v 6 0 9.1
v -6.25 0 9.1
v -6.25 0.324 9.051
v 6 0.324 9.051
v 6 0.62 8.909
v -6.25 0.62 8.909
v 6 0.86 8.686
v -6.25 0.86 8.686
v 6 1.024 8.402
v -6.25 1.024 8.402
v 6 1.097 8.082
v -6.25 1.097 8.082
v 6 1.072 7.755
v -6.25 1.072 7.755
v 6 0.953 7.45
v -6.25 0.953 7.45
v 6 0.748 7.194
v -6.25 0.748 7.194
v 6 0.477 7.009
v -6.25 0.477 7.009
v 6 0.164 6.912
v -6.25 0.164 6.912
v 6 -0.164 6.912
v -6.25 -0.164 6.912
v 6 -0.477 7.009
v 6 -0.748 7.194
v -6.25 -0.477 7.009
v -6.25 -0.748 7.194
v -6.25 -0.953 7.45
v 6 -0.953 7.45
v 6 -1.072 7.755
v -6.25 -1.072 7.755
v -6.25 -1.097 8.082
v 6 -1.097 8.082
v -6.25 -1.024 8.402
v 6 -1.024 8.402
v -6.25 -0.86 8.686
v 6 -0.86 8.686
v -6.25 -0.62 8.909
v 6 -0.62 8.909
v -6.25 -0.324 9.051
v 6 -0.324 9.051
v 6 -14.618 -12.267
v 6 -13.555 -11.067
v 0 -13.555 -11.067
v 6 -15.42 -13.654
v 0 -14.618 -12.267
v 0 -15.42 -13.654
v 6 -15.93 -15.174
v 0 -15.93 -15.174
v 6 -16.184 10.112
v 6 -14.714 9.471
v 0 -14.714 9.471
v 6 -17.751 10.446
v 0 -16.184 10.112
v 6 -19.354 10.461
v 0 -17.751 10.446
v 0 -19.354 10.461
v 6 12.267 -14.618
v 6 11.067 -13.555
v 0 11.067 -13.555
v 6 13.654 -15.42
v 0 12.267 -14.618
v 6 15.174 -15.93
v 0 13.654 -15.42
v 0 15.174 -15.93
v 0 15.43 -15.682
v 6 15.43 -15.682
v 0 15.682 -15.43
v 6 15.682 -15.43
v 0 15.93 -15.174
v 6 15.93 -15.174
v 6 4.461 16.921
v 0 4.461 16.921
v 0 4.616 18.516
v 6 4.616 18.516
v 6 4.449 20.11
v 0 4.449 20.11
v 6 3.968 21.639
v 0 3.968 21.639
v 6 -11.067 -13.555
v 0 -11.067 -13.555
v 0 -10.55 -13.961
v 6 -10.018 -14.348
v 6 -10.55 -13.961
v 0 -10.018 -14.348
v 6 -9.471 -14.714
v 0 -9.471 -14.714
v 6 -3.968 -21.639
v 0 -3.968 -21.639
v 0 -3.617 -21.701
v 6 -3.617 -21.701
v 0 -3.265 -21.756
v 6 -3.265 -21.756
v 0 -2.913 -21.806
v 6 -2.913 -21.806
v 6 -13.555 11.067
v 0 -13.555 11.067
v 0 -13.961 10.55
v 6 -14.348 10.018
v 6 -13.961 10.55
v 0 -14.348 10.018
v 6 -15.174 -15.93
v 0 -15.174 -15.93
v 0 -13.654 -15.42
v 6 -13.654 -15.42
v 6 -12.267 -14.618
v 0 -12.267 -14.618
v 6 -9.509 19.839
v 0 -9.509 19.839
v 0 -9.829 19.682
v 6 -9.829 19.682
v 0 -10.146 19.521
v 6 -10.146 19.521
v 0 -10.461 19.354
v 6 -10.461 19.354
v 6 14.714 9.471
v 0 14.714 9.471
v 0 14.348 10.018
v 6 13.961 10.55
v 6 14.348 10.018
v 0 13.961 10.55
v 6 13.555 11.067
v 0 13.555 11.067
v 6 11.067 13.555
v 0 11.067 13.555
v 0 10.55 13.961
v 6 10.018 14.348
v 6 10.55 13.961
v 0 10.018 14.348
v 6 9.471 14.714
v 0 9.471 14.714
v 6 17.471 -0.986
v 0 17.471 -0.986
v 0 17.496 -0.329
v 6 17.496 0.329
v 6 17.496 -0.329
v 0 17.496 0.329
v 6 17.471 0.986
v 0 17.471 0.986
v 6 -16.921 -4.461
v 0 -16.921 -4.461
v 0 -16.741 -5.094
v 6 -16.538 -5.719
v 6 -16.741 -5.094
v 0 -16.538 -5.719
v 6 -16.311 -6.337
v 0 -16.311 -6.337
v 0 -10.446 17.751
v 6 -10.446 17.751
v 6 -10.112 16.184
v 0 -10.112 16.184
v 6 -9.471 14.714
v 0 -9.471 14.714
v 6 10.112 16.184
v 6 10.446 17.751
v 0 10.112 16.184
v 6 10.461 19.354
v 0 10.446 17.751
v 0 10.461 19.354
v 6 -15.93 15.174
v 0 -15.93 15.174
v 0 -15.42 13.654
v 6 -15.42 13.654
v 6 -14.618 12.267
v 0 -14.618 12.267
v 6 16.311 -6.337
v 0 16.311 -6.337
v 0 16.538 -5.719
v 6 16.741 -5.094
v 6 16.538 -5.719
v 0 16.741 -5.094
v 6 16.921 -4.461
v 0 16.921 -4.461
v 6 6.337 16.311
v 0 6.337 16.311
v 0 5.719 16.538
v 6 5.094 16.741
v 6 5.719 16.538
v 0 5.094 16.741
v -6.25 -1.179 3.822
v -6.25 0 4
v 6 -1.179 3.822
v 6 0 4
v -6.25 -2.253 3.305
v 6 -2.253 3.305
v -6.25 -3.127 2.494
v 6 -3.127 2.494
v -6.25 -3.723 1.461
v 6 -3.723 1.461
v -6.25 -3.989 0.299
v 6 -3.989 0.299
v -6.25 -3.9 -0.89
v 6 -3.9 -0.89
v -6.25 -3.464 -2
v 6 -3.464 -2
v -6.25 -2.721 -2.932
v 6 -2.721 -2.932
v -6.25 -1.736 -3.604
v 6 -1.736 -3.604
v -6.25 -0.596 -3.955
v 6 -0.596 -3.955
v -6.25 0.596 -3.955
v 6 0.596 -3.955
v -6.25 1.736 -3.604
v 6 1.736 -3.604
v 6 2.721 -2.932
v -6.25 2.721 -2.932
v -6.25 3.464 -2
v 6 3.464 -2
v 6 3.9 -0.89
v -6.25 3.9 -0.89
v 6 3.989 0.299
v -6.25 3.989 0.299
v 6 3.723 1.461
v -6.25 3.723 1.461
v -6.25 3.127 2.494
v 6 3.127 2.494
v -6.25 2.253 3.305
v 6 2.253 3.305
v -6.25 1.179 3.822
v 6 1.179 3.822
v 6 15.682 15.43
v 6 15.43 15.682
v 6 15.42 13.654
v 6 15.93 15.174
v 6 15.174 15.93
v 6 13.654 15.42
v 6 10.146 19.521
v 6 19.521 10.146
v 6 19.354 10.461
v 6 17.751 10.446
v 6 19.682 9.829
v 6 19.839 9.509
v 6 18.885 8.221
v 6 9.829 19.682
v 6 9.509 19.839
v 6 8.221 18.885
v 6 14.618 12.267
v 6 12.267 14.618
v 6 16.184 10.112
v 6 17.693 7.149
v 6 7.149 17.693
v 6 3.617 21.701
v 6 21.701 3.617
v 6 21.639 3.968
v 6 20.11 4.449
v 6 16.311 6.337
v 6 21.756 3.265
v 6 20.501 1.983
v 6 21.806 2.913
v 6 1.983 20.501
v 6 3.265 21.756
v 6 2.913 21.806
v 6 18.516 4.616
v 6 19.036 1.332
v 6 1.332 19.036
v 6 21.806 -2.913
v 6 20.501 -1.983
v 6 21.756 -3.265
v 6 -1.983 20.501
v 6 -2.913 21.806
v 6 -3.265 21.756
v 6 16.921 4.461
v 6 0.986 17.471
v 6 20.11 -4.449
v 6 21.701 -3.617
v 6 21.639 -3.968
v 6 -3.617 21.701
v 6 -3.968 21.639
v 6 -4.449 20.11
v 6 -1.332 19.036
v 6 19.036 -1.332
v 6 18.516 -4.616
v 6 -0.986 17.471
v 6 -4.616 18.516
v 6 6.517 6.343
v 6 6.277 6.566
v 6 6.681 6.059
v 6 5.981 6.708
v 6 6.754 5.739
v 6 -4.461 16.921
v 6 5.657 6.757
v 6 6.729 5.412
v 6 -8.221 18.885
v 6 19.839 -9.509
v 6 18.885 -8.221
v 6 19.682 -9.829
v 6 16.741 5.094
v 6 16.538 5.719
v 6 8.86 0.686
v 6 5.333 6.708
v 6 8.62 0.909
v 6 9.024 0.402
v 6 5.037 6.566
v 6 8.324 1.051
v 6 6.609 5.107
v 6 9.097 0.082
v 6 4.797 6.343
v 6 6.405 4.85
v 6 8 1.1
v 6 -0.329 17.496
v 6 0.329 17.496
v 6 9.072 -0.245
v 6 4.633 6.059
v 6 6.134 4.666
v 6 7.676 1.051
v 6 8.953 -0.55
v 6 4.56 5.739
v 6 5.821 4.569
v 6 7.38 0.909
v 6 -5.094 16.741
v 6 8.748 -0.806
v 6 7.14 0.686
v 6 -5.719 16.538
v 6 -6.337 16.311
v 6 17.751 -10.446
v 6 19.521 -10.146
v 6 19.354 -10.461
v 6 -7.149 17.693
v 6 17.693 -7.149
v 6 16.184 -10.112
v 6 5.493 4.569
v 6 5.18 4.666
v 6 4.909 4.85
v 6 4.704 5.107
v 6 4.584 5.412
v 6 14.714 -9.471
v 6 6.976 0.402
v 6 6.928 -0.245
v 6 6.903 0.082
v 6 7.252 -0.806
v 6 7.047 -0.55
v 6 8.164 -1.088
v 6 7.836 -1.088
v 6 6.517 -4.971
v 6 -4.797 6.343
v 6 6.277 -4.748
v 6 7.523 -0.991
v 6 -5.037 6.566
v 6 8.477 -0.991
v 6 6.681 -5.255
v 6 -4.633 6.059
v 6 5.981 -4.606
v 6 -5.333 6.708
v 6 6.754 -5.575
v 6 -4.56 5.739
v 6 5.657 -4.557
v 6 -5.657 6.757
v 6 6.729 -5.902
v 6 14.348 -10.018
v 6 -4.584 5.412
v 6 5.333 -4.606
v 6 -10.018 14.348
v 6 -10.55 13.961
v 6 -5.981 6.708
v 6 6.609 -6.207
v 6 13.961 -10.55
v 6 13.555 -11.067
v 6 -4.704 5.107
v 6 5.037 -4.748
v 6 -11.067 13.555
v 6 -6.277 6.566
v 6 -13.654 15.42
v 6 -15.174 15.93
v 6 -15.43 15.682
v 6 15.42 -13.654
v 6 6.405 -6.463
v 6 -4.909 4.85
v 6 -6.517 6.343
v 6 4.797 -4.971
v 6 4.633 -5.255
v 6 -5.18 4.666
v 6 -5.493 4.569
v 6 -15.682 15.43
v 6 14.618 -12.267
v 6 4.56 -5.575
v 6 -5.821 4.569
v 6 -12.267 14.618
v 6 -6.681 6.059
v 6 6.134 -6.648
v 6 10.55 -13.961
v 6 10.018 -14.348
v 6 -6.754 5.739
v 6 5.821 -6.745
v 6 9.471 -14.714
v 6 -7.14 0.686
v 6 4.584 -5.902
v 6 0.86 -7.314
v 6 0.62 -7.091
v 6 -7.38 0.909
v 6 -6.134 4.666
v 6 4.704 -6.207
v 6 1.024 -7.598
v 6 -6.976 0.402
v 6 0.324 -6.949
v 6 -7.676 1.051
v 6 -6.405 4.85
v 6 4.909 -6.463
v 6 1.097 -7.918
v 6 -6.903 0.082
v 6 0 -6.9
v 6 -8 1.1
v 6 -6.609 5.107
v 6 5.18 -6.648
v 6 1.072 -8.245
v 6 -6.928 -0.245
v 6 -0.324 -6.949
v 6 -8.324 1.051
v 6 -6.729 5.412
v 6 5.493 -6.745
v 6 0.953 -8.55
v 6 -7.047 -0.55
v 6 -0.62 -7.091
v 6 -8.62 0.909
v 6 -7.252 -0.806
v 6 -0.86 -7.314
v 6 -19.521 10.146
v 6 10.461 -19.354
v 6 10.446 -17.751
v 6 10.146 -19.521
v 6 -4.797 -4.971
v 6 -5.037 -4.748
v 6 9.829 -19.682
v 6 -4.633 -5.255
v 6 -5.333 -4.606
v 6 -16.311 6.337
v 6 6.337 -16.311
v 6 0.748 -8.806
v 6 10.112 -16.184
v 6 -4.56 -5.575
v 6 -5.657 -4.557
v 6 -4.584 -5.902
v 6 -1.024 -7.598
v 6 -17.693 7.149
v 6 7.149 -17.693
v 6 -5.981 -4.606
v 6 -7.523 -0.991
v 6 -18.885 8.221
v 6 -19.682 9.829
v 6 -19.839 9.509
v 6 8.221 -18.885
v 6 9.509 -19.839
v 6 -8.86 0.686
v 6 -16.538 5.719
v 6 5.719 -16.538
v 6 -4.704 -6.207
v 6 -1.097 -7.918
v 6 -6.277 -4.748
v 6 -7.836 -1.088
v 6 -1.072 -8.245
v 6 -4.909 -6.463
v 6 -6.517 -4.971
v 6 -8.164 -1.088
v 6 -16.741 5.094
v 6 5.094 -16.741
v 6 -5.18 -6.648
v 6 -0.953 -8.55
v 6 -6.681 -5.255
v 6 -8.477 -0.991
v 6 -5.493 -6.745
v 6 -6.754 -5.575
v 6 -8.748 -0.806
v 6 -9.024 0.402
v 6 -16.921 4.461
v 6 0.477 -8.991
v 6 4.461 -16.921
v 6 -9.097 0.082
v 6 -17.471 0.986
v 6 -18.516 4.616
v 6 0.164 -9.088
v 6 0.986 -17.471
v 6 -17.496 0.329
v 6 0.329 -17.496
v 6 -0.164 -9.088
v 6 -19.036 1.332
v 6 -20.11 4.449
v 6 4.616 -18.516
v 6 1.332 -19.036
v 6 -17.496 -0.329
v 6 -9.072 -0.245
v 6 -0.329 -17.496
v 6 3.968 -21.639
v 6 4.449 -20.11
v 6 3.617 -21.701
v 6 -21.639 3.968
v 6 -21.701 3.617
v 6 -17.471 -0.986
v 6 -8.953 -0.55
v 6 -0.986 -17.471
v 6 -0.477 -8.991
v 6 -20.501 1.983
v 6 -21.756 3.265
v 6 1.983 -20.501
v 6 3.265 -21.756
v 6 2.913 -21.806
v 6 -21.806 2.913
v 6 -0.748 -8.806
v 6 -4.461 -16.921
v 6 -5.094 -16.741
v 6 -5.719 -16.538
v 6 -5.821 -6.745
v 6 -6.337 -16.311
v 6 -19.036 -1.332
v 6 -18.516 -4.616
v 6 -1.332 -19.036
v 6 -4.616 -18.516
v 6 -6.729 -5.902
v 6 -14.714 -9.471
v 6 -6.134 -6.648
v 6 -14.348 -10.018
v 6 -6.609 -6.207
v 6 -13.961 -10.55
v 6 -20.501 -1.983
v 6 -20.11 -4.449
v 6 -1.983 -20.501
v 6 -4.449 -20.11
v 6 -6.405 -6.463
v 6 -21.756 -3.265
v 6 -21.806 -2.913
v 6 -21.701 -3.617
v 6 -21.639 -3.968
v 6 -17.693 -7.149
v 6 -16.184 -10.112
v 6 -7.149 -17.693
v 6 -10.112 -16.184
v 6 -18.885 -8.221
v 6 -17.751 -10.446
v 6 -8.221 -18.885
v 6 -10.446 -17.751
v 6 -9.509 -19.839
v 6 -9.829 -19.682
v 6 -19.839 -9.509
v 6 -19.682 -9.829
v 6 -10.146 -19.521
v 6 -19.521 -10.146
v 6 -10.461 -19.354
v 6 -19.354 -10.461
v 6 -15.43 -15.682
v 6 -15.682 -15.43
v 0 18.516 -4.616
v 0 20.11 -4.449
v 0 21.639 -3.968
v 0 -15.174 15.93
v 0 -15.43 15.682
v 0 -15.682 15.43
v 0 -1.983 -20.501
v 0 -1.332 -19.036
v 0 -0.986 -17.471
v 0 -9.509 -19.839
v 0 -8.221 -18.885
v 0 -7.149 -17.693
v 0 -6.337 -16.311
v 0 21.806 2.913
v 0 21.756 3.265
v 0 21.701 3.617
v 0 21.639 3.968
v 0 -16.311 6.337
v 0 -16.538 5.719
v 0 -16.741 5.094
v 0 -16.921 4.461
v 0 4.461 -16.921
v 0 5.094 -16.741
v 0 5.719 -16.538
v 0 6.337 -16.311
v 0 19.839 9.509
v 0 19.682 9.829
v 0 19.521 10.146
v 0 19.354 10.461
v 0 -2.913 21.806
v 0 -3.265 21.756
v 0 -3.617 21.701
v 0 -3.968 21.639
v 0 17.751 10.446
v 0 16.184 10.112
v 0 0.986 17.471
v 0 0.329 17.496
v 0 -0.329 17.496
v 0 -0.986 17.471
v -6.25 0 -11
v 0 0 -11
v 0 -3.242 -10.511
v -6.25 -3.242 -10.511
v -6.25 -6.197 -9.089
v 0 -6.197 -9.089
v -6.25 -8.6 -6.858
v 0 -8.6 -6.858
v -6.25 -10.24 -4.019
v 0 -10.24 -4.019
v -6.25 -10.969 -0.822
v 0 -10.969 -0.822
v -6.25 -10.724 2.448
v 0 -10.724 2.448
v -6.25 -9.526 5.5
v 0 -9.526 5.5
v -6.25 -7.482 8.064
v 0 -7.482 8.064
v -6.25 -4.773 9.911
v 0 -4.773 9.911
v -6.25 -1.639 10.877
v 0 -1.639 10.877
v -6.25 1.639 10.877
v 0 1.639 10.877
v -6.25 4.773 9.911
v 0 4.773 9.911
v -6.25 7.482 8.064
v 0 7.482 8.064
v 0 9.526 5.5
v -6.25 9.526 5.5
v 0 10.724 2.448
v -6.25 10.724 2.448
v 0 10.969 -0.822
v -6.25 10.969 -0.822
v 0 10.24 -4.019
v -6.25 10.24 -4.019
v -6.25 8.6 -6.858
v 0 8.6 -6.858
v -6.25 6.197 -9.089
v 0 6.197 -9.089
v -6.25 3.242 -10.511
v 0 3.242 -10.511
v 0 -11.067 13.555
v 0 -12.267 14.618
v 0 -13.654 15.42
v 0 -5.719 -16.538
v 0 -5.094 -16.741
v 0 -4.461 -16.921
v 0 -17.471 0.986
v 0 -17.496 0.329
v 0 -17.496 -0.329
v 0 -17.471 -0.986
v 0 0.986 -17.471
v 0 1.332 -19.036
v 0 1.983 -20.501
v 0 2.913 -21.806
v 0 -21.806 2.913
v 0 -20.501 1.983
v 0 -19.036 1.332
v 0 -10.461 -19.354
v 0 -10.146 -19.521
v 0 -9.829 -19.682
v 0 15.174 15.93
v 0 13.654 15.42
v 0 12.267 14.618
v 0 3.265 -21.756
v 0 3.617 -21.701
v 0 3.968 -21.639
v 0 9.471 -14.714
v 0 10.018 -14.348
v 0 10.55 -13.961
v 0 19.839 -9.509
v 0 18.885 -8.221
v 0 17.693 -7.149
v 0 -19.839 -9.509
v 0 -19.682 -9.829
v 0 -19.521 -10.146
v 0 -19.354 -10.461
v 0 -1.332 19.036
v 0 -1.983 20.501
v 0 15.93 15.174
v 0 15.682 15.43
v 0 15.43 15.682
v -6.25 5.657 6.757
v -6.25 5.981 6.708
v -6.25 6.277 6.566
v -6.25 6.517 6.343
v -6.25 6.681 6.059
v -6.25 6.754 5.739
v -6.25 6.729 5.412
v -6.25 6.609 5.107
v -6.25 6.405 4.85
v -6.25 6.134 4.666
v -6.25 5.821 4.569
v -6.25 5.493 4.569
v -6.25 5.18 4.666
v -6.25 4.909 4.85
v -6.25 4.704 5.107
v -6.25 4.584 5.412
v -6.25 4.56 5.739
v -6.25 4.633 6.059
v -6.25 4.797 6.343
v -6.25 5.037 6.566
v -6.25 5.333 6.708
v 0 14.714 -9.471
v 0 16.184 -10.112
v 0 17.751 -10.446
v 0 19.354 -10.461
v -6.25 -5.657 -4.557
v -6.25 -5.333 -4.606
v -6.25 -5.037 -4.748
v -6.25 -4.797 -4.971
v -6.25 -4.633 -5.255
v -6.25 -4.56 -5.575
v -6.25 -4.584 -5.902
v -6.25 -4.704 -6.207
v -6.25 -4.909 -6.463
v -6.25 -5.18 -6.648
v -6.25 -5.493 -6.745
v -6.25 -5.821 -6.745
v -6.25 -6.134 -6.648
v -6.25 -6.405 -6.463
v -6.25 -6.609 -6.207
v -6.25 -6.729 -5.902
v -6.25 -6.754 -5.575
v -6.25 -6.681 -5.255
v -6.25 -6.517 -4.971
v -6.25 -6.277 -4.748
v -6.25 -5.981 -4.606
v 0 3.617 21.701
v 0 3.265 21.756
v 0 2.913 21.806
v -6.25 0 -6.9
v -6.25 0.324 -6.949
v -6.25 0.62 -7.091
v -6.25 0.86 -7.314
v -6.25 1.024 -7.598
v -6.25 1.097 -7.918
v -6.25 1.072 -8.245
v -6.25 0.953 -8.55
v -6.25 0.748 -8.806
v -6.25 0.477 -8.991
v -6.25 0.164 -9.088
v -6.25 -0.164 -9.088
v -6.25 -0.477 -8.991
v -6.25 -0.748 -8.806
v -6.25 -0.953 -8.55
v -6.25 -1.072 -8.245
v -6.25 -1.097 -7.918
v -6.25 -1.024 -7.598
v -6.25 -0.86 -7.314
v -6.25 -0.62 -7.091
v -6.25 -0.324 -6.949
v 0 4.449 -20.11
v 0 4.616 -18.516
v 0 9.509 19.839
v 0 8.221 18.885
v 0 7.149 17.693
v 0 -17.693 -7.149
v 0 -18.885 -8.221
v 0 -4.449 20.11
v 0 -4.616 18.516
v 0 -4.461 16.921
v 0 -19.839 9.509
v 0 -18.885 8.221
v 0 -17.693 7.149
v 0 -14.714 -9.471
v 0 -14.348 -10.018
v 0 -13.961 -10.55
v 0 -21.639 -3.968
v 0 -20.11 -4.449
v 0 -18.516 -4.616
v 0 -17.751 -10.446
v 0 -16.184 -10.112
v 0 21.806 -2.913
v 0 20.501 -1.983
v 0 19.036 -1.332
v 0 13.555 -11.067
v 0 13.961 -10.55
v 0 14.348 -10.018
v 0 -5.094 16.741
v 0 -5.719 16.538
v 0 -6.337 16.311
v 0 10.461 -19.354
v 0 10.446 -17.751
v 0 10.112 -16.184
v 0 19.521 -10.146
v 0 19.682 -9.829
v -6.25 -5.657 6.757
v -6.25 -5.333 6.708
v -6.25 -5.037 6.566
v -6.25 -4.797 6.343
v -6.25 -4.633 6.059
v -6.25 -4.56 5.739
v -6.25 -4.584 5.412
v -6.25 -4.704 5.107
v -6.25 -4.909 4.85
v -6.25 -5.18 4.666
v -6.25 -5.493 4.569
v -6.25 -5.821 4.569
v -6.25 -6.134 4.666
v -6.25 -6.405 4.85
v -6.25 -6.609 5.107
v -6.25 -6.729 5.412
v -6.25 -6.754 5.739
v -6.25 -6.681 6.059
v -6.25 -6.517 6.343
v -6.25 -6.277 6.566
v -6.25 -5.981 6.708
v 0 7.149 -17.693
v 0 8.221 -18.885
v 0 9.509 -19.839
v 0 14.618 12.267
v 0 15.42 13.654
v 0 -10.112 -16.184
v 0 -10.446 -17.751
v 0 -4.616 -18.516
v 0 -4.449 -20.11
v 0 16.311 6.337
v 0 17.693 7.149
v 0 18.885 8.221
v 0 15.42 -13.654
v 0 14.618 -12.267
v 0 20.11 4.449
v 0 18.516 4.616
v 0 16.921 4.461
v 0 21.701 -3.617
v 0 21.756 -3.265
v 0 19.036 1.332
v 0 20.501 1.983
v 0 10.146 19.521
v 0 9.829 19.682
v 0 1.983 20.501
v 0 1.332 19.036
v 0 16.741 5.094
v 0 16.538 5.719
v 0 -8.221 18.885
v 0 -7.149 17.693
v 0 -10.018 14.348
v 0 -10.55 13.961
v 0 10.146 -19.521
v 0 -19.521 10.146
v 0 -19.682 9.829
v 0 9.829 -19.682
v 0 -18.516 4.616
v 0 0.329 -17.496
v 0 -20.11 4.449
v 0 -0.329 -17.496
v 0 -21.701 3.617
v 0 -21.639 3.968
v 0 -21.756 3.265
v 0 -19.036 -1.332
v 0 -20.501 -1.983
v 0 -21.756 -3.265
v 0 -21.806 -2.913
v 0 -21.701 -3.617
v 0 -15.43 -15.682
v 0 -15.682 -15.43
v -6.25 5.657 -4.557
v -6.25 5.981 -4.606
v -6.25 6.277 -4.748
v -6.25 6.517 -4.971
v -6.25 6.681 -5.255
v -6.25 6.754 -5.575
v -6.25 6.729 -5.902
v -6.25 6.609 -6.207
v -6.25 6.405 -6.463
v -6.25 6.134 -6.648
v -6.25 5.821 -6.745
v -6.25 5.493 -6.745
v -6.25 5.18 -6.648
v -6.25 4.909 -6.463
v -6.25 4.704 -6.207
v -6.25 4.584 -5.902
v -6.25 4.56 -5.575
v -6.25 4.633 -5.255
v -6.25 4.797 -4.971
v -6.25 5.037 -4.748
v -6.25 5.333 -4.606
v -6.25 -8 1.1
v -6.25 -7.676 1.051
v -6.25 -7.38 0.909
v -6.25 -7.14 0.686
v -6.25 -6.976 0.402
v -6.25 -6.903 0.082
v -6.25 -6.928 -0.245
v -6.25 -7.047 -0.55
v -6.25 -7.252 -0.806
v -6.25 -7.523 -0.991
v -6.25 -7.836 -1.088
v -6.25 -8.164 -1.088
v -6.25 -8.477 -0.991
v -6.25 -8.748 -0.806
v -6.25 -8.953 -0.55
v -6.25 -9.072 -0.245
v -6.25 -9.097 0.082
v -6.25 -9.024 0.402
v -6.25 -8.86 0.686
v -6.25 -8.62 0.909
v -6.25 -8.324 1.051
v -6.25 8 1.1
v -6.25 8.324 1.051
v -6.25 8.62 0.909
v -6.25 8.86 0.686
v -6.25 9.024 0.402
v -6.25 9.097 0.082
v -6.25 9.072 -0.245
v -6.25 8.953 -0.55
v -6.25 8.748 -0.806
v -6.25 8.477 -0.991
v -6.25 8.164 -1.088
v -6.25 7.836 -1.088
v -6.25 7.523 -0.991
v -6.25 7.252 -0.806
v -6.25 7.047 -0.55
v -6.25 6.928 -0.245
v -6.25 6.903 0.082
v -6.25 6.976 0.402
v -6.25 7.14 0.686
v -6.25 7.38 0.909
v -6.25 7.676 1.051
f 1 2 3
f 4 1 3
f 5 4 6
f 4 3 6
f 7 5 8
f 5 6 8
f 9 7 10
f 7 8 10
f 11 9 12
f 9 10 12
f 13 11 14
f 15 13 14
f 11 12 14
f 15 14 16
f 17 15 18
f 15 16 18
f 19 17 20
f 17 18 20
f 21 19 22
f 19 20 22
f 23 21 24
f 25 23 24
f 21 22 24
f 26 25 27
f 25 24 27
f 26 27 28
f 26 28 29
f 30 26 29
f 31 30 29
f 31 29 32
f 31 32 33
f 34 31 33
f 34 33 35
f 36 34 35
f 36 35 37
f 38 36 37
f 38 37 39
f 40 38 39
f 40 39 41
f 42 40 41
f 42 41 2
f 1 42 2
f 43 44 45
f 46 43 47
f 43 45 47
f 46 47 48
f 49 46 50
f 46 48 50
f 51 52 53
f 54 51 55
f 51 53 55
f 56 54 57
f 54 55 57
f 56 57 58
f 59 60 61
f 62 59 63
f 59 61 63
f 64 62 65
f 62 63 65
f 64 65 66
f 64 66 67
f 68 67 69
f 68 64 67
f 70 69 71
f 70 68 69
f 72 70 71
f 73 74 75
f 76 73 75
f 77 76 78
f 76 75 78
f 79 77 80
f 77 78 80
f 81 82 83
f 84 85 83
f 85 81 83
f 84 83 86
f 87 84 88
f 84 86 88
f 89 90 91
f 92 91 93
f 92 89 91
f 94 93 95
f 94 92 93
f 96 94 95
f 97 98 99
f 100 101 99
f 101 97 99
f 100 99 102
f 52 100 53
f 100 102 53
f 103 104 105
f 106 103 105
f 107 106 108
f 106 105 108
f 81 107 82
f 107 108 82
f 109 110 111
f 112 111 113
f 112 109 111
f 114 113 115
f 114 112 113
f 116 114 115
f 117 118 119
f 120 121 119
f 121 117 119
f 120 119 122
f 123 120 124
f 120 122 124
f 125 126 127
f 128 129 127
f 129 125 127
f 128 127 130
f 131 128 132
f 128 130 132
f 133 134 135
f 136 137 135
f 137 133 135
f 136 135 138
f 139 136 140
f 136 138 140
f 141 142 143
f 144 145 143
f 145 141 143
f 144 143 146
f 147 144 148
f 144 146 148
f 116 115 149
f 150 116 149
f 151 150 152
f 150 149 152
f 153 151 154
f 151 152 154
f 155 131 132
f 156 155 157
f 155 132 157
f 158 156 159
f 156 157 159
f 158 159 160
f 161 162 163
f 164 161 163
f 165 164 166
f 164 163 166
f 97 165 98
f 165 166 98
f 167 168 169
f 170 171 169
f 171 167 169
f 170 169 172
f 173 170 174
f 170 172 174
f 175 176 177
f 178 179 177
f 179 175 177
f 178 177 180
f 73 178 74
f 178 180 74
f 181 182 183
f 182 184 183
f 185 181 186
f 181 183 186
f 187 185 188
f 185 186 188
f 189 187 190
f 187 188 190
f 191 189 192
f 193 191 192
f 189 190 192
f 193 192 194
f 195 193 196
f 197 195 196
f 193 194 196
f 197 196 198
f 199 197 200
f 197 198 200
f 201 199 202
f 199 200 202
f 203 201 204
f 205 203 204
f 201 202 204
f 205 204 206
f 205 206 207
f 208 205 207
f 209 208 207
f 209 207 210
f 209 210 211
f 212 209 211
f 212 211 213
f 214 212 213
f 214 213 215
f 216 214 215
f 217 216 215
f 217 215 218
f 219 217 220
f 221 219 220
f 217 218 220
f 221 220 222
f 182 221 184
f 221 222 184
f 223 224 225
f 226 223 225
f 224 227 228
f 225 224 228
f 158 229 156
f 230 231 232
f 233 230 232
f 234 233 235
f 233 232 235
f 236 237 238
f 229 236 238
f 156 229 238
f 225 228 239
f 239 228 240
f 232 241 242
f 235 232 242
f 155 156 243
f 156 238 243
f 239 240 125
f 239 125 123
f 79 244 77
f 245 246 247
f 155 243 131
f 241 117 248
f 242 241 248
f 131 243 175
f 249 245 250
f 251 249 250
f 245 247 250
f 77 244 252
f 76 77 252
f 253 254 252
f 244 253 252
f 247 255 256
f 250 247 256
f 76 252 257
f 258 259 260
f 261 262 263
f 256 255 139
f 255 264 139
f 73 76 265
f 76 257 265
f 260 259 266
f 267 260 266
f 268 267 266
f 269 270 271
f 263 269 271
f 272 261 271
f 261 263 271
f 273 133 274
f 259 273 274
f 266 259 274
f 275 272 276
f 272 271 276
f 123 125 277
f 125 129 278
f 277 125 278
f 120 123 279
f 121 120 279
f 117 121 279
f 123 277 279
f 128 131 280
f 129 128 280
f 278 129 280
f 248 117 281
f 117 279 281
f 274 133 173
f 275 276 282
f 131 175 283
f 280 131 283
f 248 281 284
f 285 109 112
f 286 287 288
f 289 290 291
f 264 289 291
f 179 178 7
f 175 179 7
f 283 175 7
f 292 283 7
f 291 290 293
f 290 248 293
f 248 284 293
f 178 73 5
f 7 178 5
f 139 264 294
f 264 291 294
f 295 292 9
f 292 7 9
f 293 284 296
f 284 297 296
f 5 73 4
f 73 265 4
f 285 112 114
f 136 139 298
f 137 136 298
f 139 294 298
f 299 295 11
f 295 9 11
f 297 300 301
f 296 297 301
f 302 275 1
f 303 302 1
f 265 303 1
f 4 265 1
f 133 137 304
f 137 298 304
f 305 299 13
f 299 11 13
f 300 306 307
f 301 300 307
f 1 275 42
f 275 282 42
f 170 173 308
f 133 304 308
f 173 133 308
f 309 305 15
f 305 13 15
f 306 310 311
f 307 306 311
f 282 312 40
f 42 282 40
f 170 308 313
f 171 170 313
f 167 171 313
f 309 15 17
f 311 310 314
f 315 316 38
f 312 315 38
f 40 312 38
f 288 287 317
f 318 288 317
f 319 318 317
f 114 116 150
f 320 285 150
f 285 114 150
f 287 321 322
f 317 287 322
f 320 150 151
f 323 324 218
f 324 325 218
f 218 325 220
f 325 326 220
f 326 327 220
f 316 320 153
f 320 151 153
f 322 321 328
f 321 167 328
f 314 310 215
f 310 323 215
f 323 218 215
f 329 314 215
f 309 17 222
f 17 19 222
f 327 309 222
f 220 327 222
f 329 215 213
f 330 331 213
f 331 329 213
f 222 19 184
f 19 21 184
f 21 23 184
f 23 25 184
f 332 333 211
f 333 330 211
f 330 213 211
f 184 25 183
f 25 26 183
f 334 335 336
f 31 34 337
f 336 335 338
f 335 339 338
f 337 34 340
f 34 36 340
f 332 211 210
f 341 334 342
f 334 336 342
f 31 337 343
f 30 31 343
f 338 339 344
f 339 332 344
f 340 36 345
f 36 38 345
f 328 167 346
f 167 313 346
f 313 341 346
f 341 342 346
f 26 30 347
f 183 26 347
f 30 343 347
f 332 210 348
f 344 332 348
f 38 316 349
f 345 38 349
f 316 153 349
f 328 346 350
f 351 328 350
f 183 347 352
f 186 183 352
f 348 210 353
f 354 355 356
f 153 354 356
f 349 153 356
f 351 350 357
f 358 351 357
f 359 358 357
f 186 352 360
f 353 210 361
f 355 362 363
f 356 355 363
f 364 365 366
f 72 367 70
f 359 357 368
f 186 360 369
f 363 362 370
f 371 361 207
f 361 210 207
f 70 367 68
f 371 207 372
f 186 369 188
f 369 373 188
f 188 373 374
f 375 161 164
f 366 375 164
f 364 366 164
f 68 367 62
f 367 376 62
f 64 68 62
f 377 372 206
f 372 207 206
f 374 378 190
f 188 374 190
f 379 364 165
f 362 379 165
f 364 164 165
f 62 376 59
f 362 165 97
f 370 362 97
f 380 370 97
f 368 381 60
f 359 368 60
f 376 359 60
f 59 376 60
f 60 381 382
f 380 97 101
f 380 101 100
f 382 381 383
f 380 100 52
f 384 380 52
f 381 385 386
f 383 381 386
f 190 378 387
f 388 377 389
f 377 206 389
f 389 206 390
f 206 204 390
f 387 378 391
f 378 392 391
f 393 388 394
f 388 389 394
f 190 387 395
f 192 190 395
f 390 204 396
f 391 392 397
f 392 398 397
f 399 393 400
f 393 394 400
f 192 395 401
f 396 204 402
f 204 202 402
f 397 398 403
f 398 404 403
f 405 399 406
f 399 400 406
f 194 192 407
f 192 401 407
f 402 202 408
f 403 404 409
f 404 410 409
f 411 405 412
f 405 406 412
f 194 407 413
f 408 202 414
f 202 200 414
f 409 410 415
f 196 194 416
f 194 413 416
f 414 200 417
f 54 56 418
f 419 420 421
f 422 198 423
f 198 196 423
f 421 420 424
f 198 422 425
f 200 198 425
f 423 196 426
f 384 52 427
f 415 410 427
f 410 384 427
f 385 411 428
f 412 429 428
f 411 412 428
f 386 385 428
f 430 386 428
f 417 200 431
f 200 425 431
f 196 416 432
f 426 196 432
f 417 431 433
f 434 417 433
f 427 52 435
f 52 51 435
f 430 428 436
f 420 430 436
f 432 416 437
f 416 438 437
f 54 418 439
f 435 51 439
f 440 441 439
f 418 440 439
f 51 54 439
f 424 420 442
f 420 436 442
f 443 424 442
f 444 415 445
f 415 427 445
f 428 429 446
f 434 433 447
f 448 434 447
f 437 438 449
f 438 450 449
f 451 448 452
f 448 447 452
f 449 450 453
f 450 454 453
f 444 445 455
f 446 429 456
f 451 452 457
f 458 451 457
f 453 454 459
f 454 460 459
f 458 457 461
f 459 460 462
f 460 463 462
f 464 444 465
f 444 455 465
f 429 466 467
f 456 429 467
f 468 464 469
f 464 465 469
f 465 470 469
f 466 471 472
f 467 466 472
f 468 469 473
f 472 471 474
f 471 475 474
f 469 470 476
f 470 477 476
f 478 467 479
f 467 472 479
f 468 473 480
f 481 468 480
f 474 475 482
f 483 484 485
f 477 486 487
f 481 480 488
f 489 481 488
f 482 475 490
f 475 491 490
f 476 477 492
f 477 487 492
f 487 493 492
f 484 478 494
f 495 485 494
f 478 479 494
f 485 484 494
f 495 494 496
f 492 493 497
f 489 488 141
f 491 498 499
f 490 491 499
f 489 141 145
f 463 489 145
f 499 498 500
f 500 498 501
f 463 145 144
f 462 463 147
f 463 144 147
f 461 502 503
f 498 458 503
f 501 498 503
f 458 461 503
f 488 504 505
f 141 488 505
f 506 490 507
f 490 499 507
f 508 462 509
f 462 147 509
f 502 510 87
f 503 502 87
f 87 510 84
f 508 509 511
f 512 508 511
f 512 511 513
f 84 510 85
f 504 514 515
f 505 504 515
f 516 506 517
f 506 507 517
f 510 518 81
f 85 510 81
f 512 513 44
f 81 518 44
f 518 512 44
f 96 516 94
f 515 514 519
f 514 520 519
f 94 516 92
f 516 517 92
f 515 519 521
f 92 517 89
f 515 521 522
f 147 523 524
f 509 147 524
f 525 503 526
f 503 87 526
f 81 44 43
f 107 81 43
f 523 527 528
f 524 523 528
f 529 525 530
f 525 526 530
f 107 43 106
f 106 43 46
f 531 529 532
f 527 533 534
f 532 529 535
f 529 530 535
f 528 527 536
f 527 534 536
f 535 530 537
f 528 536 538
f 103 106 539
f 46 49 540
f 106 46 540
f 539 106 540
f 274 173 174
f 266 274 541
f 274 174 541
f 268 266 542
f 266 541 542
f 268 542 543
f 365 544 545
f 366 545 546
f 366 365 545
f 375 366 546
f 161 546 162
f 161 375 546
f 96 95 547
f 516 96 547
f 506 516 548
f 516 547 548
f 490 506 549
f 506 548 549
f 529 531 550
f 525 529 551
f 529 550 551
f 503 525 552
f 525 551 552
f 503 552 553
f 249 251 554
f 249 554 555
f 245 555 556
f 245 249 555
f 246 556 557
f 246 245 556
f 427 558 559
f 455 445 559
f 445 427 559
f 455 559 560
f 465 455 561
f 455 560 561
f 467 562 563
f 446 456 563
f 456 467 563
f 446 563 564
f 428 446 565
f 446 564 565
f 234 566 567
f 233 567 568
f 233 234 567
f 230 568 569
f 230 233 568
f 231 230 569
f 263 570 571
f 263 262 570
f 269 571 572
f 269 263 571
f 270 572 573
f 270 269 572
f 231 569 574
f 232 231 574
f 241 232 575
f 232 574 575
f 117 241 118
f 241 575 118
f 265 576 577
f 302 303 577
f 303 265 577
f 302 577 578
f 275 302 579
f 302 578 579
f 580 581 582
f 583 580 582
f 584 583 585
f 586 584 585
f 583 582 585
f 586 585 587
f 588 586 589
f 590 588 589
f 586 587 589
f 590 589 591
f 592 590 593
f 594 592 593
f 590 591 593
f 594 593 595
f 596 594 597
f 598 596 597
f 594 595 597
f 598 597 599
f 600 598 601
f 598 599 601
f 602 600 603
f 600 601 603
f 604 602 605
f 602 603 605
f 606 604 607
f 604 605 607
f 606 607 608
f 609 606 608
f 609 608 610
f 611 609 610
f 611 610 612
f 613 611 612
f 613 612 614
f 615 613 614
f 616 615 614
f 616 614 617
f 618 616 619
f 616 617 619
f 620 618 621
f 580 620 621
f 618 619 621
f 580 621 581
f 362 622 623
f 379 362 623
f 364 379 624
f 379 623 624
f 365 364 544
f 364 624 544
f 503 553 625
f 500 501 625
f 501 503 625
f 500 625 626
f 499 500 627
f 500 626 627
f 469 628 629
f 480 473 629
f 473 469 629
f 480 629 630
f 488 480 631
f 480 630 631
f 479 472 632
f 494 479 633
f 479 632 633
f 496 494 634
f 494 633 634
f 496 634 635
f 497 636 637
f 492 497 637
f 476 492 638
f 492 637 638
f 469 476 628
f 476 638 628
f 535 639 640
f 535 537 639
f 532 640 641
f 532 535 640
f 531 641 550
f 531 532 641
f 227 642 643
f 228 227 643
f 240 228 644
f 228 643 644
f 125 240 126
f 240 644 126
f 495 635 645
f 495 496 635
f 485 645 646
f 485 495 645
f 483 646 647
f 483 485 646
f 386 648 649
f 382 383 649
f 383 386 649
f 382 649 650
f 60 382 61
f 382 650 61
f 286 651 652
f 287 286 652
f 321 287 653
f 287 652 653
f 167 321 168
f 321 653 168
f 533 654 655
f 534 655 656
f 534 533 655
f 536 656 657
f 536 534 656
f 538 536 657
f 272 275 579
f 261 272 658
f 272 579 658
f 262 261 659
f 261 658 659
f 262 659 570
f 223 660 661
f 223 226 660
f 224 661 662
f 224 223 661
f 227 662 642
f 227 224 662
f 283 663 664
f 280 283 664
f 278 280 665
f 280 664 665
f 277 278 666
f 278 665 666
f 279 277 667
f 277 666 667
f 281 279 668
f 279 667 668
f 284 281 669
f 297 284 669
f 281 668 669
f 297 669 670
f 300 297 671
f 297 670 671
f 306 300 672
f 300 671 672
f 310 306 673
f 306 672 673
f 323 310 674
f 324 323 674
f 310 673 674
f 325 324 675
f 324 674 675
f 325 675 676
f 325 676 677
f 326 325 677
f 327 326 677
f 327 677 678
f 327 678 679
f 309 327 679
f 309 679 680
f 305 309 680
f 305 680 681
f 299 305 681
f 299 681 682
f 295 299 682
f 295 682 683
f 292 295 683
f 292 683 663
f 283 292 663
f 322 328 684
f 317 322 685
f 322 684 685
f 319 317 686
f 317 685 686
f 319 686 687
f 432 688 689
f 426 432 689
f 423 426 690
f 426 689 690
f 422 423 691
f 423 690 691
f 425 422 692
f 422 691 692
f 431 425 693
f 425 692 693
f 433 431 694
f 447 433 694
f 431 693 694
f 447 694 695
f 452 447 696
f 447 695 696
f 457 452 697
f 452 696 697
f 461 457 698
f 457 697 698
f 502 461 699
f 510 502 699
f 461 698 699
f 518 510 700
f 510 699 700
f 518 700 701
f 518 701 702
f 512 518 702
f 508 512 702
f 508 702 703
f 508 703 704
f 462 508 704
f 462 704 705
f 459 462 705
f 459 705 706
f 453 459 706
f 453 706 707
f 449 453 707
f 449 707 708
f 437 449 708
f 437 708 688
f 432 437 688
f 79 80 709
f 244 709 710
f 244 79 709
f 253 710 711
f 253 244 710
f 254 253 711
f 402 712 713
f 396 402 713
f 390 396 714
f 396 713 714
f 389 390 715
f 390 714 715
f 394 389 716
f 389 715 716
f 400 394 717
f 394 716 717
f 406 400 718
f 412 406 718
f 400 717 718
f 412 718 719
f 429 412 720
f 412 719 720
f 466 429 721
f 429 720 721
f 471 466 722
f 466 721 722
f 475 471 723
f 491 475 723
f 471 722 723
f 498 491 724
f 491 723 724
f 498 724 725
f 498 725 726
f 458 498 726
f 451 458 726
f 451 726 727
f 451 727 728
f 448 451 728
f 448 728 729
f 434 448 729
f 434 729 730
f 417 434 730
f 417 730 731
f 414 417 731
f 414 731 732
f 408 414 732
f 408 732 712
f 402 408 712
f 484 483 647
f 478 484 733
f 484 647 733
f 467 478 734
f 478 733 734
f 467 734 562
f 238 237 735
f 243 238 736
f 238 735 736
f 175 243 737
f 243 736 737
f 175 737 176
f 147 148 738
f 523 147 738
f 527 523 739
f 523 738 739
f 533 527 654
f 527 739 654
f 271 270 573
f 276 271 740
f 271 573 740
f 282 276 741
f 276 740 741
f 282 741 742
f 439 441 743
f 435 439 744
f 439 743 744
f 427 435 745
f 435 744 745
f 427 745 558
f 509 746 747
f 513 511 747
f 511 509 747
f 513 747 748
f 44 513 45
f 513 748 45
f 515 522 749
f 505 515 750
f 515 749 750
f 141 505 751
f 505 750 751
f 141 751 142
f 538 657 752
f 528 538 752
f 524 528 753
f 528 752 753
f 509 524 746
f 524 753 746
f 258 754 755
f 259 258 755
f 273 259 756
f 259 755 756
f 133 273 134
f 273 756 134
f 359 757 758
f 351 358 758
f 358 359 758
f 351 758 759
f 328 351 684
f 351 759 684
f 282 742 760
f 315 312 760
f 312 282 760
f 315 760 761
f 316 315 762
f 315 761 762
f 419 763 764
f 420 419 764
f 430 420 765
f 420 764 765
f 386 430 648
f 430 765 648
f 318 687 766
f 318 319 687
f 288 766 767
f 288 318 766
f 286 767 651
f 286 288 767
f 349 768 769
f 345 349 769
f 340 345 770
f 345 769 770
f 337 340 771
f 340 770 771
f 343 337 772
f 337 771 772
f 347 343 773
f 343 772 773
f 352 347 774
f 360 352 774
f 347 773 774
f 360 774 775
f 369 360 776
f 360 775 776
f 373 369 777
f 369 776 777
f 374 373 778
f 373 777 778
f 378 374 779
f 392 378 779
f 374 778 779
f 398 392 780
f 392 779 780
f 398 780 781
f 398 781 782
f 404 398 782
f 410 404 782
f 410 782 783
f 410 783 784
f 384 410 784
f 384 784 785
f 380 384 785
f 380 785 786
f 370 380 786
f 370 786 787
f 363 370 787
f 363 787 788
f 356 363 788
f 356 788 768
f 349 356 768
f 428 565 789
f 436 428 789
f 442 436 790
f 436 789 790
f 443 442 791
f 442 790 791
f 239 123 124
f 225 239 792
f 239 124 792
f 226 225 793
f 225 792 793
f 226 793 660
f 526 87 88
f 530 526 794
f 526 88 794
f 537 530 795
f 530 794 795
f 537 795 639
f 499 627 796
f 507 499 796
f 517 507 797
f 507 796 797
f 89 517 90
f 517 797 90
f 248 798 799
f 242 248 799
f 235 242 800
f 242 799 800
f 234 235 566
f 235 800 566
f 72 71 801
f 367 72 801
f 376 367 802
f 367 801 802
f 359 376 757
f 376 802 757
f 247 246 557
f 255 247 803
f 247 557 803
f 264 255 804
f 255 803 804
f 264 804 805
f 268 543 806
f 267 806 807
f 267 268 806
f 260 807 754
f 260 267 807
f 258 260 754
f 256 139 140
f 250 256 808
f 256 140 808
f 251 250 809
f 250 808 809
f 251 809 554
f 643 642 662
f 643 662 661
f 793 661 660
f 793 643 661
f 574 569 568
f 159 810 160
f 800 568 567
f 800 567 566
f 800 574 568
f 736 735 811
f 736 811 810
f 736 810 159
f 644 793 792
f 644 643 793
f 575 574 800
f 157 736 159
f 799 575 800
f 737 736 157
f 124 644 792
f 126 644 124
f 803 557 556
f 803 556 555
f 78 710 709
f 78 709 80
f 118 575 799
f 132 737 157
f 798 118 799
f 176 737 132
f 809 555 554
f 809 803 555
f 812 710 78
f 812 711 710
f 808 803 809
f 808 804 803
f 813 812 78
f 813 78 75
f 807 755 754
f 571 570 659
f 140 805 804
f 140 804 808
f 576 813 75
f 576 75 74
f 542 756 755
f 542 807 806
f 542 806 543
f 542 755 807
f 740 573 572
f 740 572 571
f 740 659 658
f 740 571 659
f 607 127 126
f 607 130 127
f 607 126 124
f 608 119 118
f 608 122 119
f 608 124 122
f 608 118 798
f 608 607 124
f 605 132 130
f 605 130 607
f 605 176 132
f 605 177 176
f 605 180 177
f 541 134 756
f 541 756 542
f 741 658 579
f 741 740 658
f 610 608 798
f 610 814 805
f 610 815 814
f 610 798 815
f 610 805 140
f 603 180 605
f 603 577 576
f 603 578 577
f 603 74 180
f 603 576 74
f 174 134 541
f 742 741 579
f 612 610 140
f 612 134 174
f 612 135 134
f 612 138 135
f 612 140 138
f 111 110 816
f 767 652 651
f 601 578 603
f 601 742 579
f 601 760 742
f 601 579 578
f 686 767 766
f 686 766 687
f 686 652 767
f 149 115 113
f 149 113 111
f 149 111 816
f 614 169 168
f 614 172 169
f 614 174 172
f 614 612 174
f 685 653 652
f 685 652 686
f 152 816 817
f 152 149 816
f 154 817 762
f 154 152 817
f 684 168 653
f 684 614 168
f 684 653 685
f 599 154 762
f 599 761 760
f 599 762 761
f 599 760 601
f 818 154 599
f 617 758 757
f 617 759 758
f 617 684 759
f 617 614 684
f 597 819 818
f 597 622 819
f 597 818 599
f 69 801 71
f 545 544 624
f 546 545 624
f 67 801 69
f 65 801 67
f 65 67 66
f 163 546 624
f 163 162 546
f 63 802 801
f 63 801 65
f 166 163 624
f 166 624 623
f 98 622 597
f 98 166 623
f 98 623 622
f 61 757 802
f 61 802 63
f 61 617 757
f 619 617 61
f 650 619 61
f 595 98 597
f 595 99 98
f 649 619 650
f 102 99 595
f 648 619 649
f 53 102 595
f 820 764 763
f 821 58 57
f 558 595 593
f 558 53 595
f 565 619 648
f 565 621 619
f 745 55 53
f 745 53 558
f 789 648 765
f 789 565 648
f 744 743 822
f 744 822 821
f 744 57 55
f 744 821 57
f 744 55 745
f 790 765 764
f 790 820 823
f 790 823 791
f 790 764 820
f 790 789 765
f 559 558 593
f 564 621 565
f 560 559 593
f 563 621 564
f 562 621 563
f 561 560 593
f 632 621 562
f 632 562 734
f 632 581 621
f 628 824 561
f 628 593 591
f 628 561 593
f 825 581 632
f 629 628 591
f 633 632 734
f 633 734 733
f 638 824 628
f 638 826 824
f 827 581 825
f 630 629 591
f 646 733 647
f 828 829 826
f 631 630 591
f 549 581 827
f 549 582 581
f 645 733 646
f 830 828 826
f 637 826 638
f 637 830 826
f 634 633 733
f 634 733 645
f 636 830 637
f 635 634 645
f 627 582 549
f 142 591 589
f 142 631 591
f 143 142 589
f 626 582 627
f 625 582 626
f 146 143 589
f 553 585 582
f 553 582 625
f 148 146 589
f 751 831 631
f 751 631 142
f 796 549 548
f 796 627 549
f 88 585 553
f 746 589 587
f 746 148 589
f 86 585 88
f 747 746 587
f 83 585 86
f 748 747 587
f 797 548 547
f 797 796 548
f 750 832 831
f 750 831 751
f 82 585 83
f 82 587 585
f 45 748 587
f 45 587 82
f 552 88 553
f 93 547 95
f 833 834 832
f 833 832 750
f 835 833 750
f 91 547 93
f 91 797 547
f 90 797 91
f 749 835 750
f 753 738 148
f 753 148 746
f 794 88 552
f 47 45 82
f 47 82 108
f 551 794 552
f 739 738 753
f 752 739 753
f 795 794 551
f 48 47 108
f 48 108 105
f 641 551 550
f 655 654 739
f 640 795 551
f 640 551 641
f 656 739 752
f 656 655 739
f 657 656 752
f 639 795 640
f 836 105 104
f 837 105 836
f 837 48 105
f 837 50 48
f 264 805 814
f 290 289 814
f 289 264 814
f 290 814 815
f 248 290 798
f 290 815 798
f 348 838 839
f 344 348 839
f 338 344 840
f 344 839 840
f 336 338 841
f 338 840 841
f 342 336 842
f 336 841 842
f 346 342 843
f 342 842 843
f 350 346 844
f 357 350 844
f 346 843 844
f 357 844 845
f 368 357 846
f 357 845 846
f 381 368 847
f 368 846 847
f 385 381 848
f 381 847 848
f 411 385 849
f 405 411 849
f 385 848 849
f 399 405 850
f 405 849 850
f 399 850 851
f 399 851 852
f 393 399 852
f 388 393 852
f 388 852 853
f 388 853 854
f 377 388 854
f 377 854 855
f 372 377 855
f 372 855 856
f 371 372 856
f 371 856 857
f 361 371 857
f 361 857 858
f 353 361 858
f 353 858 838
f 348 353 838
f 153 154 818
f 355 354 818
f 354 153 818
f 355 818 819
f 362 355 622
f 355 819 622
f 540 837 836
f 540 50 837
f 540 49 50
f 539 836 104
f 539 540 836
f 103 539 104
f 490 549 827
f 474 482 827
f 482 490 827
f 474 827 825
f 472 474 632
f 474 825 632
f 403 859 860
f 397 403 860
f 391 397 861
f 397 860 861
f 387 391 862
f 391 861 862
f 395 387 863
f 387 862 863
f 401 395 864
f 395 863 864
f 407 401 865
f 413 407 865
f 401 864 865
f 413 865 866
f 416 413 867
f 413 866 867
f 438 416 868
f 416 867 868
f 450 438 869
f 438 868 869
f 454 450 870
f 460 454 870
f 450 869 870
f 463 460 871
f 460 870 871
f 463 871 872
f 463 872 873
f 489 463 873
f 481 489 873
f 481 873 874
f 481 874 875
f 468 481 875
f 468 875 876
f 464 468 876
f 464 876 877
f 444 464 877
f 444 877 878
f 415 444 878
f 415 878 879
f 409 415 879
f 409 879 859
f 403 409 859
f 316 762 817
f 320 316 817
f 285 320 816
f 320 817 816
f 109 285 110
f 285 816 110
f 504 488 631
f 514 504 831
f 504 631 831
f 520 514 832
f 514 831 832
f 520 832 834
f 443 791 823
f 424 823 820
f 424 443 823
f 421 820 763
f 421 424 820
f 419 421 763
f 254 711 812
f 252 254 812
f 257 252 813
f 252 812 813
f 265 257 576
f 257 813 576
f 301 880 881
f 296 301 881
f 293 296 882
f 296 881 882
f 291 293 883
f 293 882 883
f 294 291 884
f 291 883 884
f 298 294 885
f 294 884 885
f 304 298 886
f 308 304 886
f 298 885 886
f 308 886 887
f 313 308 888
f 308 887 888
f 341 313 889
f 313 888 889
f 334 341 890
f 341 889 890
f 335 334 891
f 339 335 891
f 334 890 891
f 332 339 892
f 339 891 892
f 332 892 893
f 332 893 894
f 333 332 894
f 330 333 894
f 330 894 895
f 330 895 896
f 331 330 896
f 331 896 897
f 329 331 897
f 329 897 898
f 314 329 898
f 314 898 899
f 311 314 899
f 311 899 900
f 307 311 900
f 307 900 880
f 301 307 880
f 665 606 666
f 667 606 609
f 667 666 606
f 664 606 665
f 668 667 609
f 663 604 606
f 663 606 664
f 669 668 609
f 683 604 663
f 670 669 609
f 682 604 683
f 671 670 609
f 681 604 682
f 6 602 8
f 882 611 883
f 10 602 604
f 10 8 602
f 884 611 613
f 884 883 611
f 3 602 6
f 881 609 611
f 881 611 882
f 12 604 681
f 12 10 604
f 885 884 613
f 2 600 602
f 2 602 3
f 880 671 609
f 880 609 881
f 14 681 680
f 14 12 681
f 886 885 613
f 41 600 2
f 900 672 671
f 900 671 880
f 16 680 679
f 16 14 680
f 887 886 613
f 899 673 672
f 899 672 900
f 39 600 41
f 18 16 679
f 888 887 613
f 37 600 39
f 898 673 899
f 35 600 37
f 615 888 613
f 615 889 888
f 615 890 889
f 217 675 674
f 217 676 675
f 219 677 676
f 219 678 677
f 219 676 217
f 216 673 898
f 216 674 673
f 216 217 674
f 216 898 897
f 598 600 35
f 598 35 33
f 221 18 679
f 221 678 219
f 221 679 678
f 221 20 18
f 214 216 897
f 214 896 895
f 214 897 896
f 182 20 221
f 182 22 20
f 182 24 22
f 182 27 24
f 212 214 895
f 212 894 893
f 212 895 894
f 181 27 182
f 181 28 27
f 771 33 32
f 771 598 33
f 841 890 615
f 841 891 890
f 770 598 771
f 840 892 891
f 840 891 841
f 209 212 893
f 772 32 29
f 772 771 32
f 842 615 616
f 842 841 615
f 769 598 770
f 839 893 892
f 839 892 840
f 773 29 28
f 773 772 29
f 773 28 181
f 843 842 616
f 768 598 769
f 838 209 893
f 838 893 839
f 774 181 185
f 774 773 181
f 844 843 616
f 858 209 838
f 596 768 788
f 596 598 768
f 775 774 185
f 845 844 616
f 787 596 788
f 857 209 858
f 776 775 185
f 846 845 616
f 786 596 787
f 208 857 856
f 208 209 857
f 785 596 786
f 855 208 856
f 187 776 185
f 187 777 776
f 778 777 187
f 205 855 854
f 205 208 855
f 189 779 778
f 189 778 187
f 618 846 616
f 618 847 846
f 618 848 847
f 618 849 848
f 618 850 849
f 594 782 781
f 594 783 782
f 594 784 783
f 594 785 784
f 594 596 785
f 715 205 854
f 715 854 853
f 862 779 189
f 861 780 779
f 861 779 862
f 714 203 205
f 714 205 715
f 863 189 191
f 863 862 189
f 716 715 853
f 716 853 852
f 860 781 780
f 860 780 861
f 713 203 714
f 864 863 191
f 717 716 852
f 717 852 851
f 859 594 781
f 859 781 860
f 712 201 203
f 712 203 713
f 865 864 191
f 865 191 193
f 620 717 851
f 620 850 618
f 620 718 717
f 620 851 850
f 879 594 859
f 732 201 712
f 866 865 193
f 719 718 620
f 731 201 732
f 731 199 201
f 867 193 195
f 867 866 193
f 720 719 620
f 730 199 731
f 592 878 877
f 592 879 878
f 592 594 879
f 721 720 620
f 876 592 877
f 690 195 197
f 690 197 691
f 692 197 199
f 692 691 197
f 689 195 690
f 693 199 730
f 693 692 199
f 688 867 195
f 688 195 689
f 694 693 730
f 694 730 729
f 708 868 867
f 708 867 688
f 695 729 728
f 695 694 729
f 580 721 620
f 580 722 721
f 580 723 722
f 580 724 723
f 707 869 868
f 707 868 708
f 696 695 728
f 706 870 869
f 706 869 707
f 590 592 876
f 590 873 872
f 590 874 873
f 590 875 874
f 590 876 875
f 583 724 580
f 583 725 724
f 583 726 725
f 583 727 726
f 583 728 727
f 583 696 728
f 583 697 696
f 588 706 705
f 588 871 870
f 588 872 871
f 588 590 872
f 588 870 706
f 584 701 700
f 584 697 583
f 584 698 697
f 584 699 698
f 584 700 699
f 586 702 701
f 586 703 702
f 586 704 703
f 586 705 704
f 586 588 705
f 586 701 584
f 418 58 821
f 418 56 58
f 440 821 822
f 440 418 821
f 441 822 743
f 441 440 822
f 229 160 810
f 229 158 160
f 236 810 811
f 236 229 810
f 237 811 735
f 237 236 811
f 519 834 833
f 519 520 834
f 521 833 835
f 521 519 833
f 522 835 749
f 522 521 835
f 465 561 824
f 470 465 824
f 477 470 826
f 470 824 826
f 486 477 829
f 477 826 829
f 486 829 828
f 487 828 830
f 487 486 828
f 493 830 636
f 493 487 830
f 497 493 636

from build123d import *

# Parameters (mm, degrees)
BASPROSKE_W          = 6
BASPROSKE_H          = 22
TOOTHCUT_DEPTH       = 32.685959036
TEETHCUTS_COUNT      = 20
TEETHCUTS_ANGLE      = 342
HUBNEAONESKE_R       = 11
HUBNEARONE_DEPTH     = 6.2500508
BORSKE_R             = 4
BORE_DEPTH           = 12.2500508
M2_CLEARANCE_HOLE1_D = 2.2


with BuildPart() as part:
    # BasProSke → Base-Revolve (revolve)
    with BuildSketch(Plane(origin=(0, 0, 0), x_dir=(1, 0, 0), z_dir=(0, 1, 0)), mode=Mode.PRIVATE) as base_revolve_sk:
        with Locations((3, 11)):
            Rectangle(BASPROSKE_W, BASPROSKE_H)
    revolve(base_revolve_sk.sketch.rotate(Axis((-10, 0, 0), (1, 0, 0)), 180), axis=Axis((-10, 0, 0), (1, 0, 0)))

    # TooCutSke → ToothCut (cut, through all)
    with BuildSketch(Plane(origin=(0, 0, 0), x_dir=(0, 0, -1), z_dir=(1, 0, 0))):
        with BuildLine():
            ThreePointArc((0.986171591, 17.471189616), (0, 17.499), (-0.986171591, 17.471189616))
            ThreePointArc((-0.986171591, 17.471189616), (-1.626916196, 19.798789858), (-2.932850173, 21.829260982))
            ThreePointArc((-2.932850173, 21.829260982), (0, 22.0254), (2.932850173, 21.829260982))
            ThreePointArc((2.932850173, 21.829260982), (1.626916196, 19.798789858), (0.986171591, 17.471189616))
        make_face()
    toothcut = extrude(amount=TOOTHCUT_DEPTH, mode=Mode.SUBTRACT)

    # TeethCuts: ToothCut ×20 about axis
    teethcuts_axis = Axis((-10, 0, 0), (1, 0, 0))
    for i in range(1, TEETHCUTS_COUNT):
        add(toothcut.rotate(teethcuts_axis, i * TEETHCUTS_ANGLE / (TEETHCUTS_COUNT - 1)), mode=Mode.SUBTRACT)

    # HubNeaOneSke → HubNearOne (add)
    with BuildSketch(Plane.ZY):
        with Locations(Location((0, 0, 0), (0, 0, 180))):
            Circle(HUBNEAONESKE_R)
    extrude(amount=HUBNEARONE_DEPTH)

    # BorSke → Bore (cut, symmetric)
    with BuildSketch(Plane(origin=(0, 0, 0), x_dir=(0, 0, -1), z_dir=(1, 0, 0))):
        with Locations(Location((0, 0, 0), (0, 0, 180))):
            Circle(BORSKE_R)
    extrude(amount=BORE_DEPTH, both=True, mode=Mode.SUBTRACT)

    # M2 Clearance Hole1 (through all)
    with Locations(Plane(origin=(6, 0, 0), x_dir=(0, 0, -1), z_dir=(1, 0, 0))):
        with Locations((0, 8), (5.656854249, 5.656854249), (8, 0), (5.656854249, -5.656854249), (0, -8), (-5.656854249, -5.656854249), (-8, 0), (-5.656854249, 5.656854249)):
            Hole(M2_CLEARANCE_HOLE1_D / 2)


solid = part.part
